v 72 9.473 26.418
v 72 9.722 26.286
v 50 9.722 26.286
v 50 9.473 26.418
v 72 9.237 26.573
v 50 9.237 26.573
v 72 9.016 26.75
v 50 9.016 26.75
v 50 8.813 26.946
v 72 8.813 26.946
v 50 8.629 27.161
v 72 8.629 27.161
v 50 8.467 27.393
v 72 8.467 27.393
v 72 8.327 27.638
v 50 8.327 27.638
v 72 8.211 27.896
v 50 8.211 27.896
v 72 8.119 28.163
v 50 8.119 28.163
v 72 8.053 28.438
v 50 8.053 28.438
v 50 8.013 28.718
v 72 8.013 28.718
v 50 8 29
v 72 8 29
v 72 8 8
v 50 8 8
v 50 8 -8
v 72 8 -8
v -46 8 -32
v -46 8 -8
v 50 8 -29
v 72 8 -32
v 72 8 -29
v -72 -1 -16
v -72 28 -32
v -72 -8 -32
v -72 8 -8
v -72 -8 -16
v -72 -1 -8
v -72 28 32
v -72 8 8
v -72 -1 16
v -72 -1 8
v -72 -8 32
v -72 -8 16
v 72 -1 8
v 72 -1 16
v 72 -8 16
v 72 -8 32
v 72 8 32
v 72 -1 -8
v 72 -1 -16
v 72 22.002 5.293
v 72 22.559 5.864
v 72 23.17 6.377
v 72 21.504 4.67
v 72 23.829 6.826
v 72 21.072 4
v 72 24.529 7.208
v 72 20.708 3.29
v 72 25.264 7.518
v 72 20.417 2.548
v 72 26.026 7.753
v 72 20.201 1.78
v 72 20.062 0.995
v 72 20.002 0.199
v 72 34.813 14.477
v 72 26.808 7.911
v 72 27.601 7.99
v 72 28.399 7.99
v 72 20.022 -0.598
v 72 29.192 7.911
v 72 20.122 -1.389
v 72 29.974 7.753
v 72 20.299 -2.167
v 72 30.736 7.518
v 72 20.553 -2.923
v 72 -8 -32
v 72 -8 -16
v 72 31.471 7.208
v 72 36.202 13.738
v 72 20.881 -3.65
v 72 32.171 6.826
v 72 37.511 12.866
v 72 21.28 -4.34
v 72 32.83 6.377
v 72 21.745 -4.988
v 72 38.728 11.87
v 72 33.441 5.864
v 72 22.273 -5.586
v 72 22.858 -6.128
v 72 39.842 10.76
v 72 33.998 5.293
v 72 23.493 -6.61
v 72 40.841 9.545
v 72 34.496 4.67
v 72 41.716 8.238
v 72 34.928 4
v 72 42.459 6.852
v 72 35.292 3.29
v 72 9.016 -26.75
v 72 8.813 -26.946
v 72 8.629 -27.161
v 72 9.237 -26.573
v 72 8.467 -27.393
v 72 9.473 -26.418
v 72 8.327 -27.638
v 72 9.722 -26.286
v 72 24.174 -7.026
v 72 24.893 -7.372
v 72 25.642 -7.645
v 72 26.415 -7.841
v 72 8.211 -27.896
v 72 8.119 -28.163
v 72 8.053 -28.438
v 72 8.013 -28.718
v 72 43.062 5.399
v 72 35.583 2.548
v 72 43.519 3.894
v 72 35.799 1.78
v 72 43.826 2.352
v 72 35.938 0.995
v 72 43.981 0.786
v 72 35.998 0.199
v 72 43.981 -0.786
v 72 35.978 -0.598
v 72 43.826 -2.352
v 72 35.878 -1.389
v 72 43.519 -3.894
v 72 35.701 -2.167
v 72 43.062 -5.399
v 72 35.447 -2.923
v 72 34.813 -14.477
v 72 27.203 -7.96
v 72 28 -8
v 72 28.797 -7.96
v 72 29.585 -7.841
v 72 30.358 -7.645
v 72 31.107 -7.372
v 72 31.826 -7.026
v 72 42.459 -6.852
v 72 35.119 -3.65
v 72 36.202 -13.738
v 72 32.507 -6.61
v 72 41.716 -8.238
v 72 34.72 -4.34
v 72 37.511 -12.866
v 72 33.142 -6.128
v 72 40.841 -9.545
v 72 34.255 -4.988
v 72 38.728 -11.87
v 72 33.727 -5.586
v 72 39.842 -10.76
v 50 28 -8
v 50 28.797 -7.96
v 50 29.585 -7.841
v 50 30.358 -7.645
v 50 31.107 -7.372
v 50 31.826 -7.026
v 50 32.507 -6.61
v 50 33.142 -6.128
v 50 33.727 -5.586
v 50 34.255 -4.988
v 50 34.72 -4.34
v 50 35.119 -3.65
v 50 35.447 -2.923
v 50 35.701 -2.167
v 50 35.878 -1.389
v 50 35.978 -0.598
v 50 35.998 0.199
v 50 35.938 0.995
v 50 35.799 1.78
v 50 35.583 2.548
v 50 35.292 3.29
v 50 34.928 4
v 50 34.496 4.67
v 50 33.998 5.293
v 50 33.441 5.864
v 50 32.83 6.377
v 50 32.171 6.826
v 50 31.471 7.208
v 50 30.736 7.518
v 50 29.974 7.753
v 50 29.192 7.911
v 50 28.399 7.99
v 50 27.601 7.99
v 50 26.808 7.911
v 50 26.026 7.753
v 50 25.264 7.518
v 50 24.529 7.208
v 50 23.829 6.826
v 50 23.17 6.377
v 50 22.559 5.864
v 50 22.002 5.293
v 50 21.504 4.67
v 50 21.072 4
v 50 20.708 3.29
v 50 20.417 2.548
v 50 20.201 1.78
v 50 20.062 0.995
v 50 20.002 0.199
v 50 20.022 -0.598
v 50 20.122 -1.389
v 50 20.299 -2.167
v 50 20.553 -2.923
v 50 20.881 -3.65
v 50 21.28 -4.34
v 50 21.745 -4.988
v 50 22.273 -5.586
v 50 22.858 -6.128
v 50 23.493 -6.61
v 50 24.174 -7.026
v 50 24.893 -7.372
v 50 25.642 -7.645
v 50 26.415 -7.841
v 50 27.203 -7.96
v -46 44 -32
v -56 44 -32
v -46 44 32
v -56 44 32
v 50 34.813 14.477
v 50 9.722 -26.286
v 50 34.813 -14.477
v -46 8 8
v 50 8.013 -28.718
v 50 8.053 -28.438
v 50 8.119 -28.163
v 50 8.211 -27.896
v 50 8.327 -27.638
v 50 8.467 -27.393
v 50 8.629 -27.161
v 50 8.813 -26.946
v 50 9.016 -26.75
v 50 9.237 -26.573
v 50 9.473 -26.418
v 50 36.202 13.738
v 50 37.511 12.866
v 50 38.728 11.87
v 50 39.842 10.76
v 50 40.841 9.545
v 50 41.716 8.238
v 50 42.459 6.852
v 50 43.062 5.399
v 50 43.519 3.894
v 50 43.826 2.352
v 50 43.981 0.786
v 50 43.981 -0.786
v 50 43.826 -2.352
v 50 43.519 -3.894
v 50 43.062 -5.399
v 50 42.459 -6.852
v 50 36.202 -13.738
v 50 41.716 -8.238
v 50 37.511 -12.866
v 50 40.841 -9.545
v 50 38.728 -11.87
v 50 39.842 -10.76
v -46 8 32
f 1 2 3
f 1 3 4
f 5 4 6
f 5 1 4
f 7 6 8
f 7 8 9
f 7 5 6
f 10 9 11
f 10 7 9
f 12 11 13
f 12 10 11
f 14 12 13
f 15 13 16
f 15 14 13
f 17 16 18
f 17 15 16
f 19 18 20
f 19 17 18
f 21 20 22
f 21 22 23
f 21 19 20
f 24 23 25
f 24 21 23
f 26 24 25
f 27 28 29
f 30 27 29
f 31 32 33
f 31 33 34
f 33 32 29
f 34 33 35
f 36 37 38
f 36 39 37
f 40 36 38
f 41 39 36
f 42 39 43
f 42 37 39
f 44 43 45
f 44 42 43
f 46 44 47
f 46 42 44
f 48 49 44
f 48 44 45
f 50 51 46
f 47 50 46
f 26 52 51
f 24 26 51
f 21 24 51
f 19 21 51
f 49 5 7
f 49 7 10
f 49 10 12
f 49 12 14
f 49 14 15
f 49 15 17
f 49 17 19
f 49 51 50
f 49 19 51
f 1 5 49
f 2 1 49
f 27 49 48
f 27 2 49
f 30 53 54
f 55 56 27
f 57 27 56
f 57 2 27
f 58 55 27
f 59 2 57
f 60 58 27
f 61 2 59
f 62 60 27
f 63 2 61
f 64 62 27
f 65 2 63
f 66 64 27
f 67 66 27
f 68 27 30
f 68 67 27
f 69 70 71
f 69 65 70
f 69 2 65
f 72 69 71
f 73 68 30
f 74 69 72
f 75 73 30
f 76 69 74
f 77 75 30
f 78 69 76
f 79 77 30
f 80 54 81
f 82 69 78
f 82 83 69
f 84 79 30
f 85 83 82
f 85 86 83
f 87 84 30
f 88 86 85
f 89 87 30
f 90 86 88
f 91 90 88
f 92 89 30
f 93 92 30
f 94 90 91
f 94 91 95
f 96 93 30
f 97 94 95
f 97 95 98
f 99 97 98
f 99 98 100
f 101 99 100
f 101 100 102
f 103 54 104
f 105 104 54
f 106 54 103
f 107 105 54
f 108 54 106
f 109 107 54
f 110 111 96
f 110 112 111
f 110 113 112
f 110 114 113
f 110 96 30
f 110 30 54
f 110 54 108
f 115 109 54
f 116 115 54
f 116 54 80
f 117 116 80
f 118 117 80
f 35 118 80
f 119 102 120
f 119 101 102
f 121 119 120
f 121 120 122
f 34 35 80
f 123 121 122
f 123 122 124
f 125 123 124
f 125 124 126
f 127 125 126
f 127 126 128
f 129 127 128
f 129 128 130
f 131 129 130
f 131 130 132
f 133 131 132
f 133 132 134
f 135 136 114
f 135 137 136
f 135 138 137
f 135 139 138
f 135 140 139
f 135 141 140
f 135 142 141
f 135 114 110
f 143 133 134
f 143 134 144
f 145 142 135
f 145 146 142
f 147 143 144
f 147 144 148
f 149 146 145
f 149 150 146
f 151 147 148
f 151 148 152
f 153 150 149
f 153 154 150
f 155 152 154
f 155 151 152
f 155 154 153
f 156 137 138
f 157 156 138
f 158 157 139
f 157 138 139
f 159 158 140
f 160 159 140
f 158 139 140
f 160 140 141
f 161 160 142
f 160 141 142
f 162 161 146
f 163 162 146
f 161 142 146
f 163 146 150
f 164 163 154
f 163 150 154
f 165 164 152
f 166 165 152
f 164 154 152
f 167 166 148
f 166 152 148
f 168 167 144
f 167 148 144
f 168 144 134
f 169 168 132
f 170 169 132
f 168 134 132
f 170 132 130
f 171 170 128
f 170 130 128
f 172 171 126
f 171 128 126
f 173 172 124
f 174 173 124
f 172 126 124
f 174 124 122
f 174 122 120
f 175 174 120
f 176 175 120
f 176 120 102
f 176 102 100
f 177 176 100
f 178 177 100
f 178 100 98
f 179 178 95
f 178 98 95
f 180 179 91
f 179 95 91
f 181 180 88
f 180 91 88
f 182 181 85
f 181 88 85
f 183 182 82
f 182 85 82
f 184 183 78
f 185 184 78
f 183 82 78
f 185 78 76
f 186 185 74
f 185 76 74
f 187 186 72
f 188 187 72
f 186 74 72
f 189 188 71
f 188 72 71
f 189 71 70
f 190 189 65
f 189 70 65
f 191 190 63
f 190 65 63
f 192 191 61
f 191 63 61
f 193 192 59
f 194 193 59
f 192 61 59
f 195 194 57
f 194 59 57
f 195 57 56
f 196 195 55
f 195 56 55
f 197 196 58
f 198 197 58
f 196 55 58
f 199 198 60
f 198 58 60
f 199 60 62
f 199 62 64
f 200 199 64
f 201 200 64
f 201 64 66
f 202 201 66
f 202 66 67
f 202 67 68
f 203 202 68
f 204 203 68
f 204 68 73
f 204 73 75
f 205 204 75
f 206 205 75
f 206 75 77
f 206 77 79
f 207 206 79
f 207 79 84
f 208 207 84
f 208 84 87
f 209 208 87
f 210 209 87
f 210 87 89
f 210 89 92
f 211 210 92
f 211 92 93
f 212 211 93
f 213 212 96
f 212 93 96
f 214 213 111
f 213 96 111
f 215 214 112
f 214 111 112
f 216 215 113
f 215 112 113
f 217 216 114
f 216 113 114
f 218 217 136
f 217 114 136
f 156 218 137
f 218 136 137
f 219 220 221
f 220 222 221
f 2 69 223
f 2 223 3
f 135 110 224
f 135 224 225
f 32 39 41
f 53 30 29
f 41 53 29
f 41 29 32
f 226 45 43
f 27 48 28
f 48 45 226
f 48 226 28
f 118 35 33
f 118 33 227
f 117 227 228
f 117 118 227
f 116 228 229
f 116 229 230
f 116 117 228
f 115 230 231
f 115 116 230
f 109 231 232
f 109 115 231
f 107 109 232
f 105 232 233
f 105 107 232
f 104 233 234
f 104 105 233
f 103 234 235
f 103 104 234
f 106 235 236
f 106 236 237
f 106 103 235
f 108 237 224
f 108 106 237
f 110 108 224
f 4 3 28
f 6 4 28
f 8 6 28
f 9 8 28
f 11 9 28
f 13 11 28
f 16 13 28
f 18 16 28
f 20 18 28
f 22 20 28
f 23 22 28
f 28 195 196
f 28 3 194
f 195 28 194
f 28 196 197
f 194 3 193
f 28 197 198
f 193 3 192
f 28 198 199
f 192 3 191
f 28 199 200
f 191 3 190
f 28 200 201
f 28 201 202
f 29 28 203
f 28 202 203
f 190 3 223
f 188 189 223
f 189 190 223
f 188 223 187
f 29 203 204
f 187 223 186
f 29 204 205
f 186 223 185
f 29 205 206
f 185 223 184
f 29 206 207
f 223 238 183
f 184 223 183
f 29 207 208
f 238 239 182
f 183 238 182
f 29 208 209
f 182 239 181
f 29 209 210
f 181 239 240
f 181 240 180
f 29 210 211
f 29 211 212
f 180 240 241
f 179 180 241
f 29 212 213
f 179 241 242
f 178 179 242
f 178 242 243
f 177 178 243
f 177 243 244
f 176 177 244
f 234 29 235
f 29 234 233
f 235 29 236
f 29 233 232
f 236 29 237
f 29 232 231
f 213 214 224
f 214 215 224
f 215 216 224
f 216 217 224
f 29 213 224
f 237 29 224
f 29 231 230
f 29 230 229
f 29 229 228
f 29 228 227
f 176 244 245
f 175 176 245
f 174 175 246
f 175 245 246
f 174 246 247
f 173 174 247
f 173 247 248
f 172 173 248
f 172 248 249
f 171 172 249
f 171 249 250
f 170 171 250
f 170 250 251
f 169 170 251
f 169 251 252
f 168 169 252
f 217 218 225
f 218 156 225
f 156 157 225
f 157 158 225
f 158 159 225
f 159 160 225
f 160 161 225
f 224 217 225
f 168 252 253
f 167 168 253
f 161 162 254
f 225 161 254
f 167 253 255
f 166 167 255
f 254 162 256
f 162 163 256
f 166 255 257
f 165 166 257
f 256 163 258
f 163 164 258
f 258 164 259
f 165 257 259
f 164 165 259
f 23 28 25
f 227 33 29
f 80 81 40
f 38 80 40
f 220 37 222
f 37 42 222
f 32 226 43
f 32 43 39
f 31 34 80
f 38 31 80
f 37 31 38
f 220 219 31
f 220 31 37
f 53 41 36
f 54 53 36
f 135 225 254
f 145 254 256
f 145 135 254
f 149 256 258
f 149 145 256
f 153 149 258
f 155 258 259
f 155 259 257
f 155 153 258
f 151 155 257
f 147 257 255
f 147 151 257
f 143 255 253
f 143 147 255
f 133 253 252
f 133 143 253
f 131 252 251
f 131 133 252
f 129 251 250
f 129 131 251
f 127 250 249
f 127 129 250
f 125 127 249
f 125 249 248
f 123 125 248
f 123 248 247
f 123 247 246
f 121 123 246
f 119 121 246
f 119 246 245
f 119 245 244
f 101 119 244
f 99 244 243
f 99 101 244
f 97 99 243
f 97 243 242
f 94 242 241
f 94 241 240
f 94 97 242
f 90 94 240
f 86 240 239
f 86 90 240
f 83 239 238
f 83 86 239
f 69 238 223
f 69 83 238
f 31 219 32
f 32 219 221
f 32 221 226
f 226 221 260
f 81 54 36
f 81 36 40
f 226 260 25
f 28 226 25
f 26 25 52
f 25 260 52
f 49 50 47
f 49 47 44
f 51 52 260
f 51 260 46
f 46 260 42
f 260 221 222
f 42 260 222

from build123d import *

# Parameters (mm, degrees)
BOSS_EXTRUDE1_DEPTH = 32
CUT_EXTRUDE1_REACH  = 146
SKETCH4_R           = 8
BOSS_EXTRUDE3_DEPTH = 22


with BuildPart() as part:
    # Sketch1 → Boss-Extrude1 (new body, symmetric)
    with BuildSketch(Plane.XY):
        Polygon((-72, 8), (-72, 28), (-56, 44), (-46, 44), (-46, 8), (72, 8), (72, -8), (-72, -8), align=None)
    extrude(amount=BOSS_EXTRUDE1_DEPTH, both=True)

    # Sketch2 → Cut-Extrude1 (cut, up to next)
    with BuildSketch(Plane(origin=(72, 0, 0), x_dir=(0, 0, -1), z_dir=(1, 0, 0)), mode=Mode.PRIVATE) as cut_extrude1_sk1:
        Polygon((-16, -8), (-16, -1), (-8, -1), (-8, 8), (8, 8), (8, -1), (16, -1), (16, -8), align=None)
    cut_extrude1_tool1 = extrude(cut_extrude1_sk1.sketch, amount=-CUT_EXTRUDE1_REACH, mode=Mode.PRIVATE) & part.part
    add(cut_extrude1_tool1.solids().sort_by_distance((72, -1.369565, 0))[0], mode=Mode.SUBTRACT)

    # Sketch4 → Boss-Extrude3 (add)
    with BuildSketch(Plane(origin=(72, 0, 0), x_dir=(0, 0, -1), z_dir=(1, 0, 0))):
        with BuildLine():
            Line((-14.476806191, 34.813375266), (-26.285598839, 9.722492138))
            ThreePointArc((-26.285598839, 9.722492138), (-27.392598928, 8.466965892), (-29, 8))
            Line((-29, 8), (29, 8))
            ThreePointArc((29, 8), (27.392598928, 8.466965892), (26.285598839, 9.722492138))
            Line((26.285598839, 9.722492138), (14.476806191, 34.813375266))
            ThreePointArc((14.476806191, 34.813375266), (0, 44), (-14.476806191, 34.813375266))
        make_face()
        with Locations((0, 28)):
            Circle(SKETCH4_R, mode=Mode.SUBTRACT)
    extrude(amount=-BOSS_EXTRUDE3_DEPTH)


solid = part.part
